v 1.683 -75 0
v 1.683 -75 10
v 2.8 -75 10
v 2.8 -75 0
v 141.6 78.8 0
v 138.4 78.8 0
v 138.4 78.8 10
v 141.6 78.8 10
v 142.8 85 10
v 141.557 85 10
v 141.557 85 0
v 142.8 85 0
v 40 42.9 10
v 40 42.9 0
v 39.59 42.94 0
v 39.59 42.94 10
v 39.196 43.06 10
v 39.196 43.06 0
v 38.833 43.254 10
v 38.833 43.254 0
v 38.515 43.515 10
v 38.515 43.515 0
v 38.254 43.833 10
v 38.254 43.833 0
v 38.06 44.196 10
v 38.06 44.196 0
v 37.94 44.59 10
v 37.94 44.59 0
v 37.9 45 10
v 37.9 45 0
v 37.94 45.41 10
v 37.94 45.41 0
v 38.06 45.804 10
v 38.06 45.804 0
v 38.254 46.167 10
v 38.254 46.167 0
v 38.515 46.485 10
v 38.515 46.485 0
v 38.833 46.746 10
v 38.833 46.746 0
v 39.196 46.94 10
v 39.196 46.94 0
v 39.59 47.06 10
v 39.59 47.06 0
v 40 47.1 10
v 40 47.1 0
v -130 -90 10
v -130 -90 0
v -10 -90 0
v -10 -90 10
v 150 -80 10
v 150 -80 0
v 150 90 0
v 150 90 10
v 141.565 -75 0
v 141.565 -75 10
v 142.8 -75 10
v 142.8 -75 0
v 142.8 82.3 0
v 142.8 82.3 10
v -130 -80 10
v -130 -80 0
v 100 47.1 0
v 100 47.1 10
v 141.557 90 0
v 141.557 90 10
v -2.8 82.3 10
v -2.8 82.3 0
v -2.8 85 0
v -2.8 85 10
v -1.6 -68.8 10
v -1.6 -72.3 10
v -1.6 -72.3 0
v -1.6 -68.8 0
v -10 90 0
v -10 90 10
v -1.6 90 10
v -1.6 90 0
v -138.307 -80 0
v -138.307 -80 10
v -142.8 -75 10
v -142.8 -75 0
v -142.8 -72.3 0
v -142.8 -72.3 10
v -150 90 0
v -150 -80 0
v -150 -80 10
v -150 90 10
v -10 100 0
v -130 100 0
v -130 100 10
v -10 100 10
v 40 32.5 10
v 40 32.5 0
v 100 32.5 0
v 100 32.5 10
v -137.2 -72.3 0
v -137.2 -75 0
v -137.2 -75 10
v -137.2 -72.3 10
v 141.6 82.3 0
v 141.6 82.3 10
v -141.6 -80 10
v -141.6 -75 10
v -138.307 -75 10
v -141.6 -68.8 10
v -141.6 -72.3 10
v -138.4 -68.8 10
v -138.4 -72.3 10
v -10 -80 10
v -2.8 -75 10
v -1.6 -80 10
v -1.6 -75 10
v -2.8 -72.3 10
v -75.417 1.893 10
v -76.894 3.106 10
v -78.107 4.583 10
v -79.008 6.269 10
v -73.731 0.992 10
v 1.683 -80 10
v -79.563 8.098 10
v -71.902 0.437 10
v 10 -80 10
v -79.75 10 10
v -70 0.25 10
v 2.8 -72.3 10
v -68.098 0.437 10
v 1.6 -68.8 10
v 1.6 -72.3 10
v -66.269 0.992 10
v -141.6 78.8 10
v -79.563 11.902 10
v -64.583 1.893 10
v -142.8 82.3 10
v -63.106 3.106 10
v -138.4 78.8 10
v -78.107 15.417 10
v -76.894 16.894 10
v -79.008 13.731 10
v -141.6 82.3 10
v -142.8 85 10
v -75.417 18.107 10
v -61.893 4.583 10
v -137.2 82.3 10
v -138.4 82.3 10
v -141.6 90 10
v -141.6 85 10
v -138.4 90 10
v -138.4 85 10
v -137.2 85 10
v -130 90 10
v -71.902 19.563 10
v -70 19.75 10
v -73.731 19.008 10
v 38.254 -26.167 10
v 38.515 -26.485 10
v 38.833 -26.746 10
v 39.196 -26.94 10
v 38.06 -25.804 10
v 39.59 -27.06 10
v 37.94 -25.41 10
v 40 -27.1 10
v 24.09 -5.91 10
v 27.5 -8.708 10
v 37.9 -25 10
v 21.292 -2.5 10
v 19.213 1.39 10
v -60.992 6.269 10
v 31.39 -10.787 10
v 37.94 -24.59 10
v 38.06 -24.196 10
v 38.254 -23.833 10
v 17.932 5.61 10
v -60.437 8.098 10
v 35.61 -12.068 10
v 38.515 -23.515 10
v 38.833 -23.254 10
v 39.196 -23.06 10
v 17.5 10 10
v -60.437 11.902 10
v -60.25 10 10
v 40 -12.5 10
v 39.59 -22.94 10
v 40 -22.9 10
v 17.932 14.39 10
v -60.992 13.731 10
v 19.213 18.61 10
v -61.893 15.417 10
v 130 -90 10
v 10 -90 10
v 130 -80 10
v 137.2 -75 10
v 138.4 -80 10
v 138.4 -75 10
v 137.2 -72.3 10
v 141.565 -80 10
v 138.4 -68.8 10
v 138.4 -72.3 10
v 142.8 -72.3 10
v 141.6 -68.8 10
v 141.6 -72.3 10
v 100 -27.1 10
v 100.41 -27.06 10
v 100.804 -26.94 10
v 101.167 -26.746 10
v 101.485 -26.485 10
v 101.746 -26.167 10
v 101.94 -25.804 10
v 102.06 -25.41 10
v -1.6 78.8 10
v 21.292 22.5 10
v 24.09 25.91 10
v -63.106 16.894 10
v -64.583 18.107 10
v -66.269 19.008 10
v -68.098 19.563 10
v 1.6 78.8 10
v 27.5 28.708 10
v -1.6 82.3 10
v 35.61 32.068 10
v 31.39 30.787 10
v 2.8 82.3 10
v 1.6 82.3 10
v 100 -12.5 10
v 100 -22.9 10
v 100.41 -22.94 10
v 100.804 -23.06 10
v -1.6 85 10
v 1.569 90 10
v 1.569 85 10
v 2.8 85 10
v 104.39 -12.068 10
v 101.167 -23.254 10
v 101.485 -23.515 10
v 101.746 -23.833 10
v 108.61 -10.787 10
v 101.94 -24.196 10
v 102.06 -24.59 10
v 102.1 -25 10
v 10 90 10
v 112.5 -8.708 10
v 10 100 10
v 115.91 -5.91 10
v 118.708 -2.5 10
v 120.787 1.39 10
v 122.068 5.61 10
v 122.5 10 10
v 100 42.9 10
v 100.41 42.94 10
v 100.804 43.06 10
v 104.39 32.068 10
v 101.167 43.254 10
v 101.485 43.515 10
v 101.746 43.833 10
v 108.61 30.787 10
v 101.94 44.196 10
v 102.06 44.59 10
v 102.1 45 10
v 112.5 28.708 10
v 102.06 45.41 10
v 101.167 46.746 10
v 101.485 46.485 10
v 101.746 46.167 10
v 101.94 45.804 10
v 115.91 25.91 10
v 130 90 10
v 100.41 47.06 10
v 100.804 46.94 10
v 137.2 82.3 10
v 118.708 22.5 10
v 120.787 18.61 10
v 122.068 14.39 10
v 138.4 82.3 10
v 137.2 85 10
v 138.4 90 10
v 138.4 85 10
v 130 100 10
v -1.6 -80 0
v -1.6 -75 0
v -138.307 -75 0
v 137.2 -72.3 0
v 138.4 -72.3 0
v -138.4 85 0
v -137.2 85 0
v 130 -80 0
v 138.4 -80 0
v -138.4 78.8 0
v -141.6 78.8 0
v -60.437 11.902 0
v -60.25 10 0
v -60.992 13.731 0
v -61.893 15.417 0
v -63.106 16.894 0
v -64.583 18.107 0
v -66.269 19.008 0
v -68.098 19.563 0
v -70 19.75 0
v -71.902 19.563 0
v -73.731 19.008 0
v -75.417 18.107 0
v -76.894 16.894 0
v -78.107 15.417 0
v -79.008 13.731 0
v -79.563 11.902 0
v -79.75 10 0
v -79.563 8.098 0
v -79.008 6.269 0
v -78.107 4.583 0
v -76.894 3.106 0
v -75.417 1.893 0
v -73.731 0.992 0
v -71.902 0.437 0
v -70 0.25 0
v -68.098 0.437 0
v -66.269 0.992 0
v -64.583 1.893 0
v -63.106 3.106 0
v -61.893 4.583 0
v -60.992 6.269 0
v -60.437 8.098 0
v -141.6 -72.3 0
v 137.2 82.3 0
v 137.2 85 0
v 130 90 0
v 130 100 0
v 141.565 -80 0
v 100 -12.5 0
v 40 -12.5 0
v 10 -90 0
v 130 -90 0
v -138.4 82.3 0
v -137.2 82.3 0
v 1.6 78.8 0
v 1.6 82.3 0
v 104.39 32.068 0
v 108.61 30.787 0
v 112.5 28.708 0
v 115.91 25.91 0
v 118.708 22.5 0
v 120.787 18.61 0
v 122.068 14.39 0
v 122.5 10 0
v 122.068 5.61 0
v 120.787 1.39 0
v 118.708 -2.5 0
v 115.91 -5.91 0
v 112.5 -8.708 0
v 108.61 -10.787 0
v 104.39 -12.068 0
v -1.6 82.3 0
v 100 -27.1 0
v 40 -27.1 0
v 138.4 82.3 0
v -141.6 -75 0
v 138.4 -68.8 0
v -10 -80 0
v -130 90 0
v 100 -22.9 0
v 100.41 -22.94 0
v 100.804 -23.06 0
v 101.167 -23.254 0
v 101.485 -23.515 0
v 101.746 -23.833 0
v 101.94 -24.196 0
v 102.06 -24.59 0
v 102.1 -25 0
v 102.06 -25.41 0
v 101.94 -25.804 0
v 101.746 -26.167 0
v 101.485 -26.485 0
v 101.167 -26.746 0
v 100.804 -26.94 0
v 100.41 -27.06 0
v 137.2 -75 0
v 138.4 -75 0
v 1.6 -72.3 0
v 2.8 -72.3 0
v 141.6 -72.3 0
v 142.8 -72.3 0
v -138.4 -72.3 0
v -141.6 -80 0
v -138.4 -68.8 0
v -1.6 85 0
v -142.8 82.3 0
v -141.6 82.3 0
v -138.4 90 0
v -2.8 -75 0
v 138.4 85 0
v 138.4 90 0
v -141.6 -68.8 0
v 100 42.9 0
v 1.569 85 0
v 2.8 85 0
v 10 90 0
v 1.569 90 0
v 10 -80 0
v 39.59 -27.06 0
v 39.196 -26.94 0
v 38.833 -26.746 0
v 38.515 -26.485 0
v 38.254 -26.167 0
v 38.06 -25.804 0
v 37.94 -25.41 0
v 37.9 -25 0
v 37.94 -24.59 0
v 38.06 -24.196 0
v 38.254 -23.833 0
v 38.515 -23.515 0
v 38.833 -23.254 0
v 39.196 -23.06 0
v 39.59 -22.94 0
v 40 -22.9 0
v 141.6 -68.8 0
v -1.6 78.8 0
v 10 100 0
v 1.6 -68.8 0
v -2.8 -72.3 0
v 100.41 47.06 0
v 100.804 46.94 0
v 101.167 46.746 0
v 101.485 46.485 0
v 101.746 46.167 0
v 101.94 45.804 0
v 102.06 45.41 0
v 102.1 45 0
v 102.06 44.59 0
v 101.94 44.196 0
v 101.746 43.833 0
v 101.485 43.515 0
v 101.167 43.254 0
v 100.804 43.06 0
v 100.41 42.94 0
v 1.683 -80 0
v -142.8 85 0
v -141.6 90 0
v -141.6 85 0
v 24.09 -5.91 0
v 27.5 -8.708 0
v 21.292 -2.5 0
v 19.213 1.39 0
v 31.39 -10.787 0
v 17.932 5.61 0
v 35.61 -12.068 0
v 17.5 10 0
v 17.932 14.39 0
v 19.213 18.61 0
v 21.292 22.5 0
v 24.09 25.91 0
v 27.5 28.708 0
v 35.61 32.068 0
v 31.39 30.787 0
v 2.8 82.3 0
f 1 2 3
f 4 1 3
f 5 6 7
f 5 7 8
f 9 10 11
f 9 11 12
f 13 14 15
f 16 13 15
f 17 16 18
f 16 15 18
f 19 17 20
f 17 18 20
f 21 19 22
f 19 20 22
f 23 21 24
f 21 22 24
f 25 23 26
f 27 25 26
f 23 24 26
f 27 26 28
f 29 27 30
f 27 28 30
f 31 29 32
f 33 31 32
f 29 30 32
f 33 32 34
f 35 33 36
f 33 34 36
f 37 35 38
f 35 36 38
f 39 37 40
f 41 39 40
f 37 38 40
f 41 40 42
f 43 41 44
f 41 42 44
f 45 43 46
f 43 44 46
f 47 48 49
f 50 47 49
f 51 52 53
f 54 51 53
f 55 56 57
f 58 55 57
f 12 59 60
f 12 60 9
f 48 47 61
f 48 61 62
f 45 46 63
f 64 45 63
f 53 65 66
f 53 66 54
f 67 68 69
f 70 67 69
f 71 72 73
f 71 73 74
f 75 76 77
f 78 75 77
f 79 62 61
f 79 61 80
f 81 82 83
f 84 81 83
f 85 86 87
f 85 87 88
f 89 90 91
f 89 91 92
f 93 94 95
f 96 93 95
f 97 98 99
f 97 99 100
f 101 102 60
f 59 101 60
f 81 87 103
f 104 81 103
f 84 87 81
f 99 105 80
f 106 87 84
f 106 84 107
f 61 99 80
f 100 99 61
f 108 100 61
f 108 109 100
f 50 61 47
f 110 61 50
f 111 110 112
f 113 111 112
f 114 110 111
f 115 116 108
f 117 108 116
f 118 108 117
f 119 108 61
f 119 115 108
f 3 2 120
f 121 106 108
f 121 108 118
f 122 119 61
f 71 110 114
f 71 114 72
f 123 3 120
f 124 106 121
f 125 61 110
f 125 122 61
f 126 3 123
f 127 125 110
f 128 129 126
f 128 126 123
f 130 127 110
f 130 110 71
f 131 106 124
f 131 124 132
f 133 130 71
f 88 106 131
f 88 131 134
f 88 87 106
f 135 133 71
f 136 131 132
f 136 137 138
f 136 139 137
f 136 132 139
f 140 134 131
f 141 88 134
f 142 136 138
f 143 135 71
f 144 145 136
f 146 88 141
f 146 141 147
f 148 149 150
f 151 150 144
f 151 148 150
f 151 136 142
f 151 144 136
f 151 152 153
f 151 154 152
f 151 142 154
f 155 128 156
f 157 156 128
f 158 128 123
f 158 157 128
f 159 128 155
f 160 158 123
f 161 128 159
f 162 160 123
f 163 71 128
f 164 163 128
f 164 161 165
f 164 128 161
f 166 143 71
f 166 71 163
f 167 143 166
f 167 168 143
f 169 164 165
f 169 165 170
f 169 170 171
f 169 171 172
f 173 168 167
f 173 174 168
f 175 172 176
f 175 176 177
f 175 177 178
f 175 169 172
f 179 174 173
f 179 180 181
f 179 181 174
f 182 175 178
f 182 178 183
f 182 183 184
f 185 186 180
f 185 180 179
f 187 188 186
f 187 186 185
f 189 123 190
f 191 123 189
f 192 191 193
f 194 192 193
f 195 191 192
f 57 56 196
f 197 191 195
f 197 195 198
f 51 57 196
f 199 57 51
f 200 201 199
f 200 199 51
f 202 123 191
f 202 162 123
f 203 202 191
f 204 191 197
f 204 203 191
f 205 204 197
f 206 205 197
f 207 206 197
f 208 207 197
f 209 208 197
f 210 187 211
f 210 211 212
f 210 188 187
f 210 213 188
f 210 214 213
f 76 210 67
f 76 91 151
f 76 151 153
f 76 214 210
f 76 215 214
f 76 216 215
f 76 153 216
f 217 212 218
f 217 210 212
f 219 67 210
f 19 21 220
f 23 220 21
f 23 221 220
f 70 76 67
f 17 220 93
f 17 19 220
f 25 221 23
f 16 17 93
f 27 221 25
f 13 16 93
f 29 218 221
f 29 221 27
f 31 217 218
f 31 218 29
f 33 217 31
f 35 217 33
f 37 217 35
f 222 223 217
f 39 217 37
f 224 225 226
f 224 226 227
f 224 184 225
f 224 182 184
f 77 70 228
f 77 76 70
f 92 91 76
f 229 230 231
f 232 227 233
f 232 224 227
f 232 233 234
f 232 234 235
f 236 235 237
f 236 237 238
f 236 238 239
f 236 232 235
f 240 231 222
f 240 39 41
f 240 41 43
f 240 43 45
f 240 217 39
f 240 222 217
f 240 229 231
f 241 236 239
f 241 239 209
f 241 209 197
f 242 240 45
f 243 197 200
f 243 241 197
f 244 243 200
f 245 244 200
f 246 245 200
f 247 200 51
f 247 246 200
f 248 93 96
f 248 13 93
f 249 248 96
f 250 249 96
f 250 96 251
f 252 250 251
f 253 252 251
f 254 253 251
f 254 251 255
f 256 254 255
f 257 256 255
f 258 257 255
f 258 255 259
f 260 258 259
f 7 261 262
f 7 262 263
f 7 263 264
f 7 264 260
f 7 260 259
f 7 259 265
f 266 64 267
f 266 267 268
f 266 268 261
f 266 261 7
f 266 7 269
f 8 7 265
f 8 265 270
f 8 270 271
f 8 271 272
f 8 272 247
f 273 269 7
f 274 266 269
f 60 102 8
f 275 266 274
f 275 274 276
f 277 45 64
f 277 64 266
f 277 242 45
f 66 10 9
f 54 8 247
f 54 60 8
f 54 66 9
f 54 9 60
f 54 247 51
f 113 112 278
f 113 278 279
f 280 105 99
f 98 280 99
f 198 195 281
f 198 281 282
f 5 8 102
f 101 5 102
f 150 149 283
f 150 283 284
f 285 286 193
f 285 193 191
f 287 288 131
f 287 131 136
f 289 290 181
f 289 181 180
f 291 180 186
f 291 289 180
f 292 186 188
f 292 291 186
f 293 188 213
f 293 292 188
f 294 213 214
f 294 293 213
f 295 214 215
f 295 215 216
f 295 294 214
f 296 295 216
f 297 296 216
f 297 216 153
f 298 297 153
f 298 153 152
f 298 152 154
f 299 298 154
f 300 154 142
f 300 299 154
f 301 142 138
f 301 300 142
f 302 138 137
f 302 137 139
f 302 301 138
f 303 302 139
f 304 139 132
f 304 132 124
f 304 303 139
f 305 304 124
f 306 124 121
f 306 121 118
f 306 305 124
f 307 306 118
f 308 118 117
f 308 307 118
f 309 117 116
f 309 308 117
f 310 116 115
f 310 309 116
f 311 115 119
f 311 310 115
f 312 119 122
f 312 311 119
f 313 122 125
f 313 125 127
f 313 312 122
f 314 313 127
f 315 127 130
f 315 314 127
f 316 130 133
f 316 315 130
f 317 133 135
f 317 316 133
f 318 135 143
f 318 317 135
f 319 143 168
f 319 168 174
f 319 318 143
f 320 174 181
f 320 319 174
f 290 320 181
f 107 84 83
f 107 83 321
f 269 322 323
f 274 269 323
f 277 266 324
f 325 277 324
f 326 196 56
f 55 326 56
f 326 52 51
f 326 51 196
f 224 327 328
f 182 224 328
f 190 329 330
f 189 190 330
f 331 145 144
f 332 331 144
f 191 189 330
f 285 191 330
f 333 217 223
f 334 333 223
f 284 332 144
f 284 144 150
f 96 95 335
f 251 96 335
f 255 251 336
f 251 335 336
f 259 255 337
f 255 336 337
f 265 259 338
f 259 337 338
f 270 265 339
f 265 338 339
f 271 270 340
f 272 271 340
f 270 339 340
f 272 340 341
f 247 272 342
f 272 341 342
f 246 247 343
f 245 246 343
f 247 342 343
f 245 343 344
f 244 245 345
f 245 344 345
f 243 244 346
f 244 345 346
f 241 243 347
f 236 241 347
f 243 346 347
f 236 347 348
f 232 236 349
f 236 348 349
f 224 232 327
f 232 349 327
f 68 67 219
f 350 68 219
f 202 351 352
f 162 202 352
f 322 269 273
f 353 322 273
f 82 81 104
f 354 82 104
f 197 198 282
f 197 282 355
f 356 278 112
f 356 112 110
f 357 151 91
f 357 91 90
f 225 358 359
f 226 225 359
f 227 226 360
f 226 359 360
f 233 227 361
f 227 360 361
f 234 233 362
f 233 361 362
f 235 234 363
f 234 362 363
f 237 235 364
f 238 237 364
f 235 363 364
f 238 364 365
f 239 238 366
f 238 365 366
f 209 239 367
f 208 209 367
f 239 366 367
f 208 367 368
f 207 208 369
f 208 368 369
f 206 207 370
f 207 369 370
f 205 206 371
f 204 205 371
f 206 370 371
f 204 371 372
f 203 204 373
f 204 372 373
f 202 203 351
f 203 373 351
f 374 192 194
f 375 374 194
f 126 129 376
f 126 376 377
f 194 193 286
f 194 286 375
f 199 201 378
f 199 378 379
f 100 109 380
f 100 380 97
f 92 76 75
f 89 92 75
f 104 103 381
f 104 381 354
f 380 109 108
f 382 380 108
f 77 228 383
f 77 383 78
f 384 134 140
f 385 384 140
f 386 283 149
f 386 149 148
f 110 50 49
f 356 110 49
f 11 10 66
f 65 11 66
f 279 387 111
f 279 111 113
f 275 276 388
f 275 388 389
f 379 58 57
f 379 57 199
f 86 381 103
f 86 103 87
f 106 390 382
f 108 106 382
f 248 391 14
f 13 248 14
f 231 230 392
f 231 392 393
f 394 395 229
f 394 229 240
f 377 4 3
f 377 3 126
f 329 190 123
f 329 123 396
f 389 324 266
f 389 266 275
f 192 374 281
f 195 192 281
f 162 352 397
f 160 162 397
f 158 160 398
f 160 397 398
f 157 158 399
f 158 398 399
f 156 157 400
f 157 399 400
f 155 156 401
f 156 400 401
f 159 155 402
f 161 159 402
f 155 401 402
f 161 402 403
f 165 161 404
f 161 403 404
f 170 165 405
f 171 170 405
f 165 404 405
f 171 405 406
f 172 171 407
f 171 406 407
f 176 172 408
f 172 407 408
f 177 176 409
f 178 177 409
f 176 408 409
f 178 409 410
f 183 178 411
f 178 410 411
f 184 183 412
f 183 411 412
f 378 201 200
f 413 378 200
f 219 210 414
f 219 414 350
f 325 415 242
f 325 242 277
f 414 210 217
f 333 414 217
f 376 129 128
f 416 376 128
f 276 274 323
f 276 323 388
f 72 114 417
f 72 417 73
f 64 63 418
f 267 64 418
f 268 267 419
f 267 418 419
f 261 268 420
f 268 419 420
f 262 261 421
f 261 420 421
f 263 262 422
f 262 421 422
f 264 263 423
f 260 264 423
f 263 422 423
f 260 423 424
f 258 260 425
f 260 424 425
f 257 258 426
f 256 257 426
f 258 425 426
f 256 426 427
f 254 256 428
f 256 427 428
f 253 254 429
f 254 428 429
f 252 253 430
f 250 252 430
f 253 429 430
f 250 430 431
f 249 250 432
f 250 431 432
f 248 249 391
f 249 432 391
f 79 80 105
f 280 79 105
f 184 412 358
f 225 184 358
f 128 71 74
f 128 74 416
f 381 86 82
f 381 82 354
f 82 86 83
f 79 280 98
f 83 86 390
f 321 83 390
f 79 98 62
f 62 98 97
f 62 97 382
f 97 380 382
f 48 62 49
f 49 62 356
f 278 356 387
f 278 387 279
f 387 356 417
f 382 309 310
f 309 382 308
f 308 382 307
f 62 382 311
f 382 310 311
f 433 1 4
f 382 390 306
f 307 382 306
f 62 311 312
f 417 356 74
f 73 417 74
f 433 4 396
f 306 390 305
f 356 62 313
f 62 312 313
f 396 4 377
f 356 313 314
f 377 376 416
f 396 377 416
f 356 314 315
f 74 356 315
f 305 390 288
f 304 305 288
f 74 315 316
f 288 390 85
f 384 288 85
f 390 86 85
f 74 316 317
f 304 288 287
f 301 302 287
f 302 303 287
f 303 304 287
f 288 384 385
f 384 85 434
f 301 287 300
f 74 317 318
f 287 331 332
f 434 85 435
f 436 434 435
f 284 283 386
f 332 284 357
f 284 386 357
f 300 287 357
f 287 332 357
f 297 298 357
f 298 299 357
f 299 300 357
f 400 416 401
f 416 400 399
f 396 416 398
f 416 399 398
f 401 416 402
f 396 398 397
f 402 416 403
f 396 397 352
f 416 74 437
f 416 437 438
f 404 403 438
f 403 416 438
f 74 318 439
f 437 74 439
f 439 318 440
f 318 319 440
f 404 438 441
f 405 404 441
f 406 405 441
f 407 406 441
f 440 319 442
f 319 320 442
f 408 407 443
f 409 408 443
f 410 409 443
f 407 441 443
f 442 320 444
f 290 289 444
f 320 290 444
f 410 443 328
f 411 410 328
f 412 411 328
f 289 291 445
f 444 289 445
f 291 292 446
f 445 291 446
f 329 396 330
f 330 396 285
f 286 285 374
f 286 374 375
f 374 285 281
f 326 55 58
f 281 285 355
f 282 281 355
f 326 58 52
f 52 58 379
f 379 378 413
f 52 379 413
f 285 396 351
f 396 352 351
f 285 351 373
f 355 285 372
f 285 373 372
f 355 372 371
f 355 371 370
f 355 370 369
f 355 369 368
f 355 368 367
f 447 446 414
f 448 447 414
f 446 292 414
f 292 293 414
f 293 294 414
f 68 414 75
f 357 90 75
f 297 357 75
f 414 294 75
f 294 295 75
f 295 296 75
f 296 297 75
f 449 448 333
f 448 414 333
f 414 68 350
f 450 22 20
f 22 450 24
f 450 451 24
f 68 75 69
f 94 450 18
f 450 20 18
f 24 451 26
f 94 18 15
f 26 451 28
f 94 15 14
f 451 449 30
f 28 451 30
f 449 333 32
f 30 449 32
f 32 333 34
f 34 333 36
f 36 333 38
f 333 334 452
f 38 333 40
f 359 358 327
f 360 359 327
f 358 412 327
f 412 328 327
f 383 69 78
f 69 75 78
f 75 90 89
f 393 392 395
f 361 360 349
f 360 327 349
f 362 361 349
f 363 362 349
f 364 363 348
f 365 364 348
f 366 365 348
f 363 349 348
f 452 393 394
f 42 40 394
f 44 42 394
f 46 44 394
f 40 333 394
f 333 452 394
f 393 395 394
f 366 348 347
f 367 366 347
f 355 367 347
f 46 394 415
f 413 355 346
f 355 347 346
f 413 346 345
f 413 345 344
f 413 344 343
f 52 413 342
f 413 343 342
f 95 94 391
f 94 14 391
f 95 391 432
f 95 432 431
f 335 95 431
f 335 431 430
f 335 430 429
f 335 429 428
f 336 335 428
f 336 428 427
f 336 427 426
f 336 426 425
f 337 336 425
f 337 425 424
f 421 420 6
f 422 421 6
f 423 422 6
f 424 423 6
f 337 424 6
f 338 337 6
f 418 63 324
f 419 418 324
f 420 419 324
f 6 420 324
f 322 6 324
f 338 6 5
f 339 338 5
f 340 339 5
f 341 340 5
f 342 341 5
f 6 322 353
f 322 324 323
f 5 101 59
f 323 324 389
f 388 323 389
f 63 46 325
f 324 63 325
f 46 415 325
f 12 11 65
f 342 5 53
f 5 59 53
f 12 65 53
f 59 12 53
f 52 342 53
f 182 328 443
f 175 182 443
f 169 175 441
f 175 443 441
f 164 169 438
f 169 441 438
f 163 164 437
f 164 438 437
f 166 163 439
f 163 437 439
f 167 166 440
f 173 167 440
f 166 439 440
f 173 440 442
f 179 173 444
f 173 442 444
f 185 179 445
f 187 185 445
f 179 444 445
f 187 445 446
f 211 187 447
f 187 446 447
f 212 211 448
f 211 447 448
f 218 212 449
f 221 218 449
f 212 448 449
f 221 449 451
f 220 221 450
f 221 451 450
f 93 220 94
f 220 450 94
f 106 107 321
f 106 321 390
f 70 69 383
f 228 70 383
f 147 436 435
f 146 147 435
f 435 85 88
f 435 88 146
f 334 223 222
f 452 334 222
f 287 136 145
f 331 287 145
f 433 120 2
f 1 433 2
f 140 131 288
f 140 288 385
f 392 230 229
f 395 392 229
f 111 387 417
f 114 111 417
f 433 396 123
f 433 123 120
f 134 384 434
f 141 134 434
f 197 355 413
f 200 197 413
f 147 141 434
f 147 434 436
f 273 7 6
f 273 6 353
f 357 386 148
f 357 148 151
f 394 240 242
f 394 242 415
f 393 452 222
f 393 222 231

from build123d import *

# Parameters (mm, degrees)
IZIM1_W                     = 300
IZIM1_H                     = 180
IZIM1_R                     = 9.75
Y_KSEKLIK_EKSTR_ZYON1_DEPTH = 10
IZIM2_W                     = 120
IZIM2_H                     = 10
Y_KSEKLIK_EKSTR_ZYON2_DEPTH = 10
IZIM3_W                     = 20
IZIM3_H                     = 10
KES_EKSTR_ZYON1_DEPTH       = 10
IZIM4_W                     = 5.6
IZIM4_H                     = 2.7
KES_EKSTR_ZYON2_DEPTH       = 10
IZIM5_W                     = 3.2
IZIM5_H                     = 3.5
IZIM5_W_2                   = 3.168851203
IZIM5_H_2                   = 5
IZIM5_H_3                   = 5.09138305
IZIM5_W_3                   = 3.157417266
IZIM5_W_4                   = 3.164794192
IZIM5_W_5                   = 3.283155767
IZIM5_W_6                   = 3.292541888
KES_EKSTR_ZYON3_DEPTH       = 10


with BuildPart() as part:
    # Çizim1 → Yükseklik-Ekstrüzyon1 (new body)
    with BuildSketch(Plane.XY):
        Rectangle(IZIM1_W, IZIM1_H)
        with Locations((-70, 10)):
            Circle(IZIM1_R, mode=Mode.SUBTRACT)
        with BuildLine():
            Line((100, -12.5), (40, -12.5))
            ThreePointArc((40, -12.5), (17.5, 10), (40, 32.5))
            Line((40, 32.5), (100, 32.5))
            ThreePointArc((100, 32.5), (122.5, 10), (100, -12.5))
        make_face(mode=Mode.SUBTRACT)
        with BuildLine():
            Line((100, 42.9), (40, 42.9))
            ThreePointArc((40, 42.9), (37.9, 45), (40, 47.1))
            Line((40, 47.1), (100, 47.1))
            ThreePointArc((100, 47.1), (102.1, 45), (100, 42.9))
        make_face(mode=Mode.SUBTRACT)
        with BuildLine():
            Line((100, -27.1), (40, -27.1))
            ThreePointArc((40, -27.1), (37.9, -25), (40, -22.9))
            Line((40, -22.9), (100, -22.9))
            ThreePointArc((100, -22.9), (102.1, -25), (100, -27.1))
        make_face(mode=Mode.SUBTRACT)
    extrude(amount=Y_KSEKLIK_EKSTR_ZYON1_DEPTH)

    # Çizim2 → Yükseklik-Ekstrüzyon2 (add)
    with BuildSketch(Plane(origin=(0, 90, 0), x_dir=(1, 0, 0), z_dir=(0, 1, 0))):
        with Locations((70, -5)):
            Rectangle(IZIM2_W, IZIM2_H)
        with Locations((-70, -5)):
            Rectangle(IZIM2_W, IZIM2_H)
    extrude(amount=Y_KSEKLIK_EKSTR_ZYON2_DEPTH)

    # Çizim3 → Kes-Ekstrüzyon1 (cut)
    with BuildSketch(Plane(origin=(0, -90, 0), x_dir=(-1, 0, 0), z_dir=(0, -1, 0))):
        with Locations((140, -5)):
            Rectangle(IZIM3_W, IZIM3_H)
        with Locations((-140, -5)):
            Rectangle(IZIM3_W, IZIM3_H)
        with Locations((0, -5)):
            Rectangle(IZIM3_W, IZIM3_H)
    extrude(amount=-KES_EKSTR_ZYON1_DEPTH, mode=Mode.SUBTRACT)

    # Çizim4 → Kes-Ekstrüzyon2 (cut)
    with BuildSketch(Plane.XY.offset(10)):
        with Locations((-140, 83.65)):
            Rectangle(IZIM4_W, IZIM4_H)
        with Locations((0, 83.65)):
            Rectangle(IZIM4_W, IZIM4_H)
        with Locations((140, 83.65)):
            Rectangle(IZIM4_W, IZIM4_H)
        with Locations((-140, -73.65)):
            Rectangle(IZIM4_W, IZIM4_H)
        with Locations((0, -73.65)):
            Rectangle(IZIM4_W, IZIM4_H)
        with Locations((140, -73.65)):
            Rectangle(IZIM4_W, IZIM4_H)
    extrude(amount=-KES_EKSTR_ZYON2_DEPTH, mode=Mode.SUBTRACT)

    # Çizim5 → Kes-Ekstrüzyon3 (cut)
    with BuildSketch(Plane.XY.offset(10)):
        with Locations((-140, 80.55)):
            Rectangle(IZIM5_W, IZIM5_H)
        with Locations((0, 80.55)):
            Rectangle(IZIM5_W, IZIM5_H)
        with Locations((140, 80.55)):
            Rectangle(IZIM5_W, IZIM5_H)
        with Locations((-140, -70.55)):
            Rectangle(IZIM5_W, IZIM5_H)
        with Locations((0, -70.55)):
            Rectangle(IZIM5_W, IZIM5_H)
        with Locations((-0.015574398, 87.5)):
            Rectangle(IZIM5_W_2, IZIM5_H_2)
        with Locations((140, -70.55)):
            Rectangle(IZIM5_W, IZIM5_H)
        with Locations((-140, 87.545691525)):
            Rectangle(IZIM5_W, IZIM5_H_3)
        with Locations((139.978708633, 87.5)):
            Rectangle(IZIM5_W_3, IZIM5_H_2)
        with Locations((139.982397096, -77.5)):
            Rectangle(IZIM5_W_4, IZIM5_H_2)
        with Locations((0.041577884, -77.5)):
            Rectangle(IZIM5_W_5, IZIM5_H_2)
        with Locations((-139.953729056, -77.5)):
            Rectangle(IZIM5_W_6, IZIM5_H_2)
    extrude(amount=-KES_EKSTR_ZYON3_DEPTH, mode=Mode.SUBTRACT)


solid = part.part
